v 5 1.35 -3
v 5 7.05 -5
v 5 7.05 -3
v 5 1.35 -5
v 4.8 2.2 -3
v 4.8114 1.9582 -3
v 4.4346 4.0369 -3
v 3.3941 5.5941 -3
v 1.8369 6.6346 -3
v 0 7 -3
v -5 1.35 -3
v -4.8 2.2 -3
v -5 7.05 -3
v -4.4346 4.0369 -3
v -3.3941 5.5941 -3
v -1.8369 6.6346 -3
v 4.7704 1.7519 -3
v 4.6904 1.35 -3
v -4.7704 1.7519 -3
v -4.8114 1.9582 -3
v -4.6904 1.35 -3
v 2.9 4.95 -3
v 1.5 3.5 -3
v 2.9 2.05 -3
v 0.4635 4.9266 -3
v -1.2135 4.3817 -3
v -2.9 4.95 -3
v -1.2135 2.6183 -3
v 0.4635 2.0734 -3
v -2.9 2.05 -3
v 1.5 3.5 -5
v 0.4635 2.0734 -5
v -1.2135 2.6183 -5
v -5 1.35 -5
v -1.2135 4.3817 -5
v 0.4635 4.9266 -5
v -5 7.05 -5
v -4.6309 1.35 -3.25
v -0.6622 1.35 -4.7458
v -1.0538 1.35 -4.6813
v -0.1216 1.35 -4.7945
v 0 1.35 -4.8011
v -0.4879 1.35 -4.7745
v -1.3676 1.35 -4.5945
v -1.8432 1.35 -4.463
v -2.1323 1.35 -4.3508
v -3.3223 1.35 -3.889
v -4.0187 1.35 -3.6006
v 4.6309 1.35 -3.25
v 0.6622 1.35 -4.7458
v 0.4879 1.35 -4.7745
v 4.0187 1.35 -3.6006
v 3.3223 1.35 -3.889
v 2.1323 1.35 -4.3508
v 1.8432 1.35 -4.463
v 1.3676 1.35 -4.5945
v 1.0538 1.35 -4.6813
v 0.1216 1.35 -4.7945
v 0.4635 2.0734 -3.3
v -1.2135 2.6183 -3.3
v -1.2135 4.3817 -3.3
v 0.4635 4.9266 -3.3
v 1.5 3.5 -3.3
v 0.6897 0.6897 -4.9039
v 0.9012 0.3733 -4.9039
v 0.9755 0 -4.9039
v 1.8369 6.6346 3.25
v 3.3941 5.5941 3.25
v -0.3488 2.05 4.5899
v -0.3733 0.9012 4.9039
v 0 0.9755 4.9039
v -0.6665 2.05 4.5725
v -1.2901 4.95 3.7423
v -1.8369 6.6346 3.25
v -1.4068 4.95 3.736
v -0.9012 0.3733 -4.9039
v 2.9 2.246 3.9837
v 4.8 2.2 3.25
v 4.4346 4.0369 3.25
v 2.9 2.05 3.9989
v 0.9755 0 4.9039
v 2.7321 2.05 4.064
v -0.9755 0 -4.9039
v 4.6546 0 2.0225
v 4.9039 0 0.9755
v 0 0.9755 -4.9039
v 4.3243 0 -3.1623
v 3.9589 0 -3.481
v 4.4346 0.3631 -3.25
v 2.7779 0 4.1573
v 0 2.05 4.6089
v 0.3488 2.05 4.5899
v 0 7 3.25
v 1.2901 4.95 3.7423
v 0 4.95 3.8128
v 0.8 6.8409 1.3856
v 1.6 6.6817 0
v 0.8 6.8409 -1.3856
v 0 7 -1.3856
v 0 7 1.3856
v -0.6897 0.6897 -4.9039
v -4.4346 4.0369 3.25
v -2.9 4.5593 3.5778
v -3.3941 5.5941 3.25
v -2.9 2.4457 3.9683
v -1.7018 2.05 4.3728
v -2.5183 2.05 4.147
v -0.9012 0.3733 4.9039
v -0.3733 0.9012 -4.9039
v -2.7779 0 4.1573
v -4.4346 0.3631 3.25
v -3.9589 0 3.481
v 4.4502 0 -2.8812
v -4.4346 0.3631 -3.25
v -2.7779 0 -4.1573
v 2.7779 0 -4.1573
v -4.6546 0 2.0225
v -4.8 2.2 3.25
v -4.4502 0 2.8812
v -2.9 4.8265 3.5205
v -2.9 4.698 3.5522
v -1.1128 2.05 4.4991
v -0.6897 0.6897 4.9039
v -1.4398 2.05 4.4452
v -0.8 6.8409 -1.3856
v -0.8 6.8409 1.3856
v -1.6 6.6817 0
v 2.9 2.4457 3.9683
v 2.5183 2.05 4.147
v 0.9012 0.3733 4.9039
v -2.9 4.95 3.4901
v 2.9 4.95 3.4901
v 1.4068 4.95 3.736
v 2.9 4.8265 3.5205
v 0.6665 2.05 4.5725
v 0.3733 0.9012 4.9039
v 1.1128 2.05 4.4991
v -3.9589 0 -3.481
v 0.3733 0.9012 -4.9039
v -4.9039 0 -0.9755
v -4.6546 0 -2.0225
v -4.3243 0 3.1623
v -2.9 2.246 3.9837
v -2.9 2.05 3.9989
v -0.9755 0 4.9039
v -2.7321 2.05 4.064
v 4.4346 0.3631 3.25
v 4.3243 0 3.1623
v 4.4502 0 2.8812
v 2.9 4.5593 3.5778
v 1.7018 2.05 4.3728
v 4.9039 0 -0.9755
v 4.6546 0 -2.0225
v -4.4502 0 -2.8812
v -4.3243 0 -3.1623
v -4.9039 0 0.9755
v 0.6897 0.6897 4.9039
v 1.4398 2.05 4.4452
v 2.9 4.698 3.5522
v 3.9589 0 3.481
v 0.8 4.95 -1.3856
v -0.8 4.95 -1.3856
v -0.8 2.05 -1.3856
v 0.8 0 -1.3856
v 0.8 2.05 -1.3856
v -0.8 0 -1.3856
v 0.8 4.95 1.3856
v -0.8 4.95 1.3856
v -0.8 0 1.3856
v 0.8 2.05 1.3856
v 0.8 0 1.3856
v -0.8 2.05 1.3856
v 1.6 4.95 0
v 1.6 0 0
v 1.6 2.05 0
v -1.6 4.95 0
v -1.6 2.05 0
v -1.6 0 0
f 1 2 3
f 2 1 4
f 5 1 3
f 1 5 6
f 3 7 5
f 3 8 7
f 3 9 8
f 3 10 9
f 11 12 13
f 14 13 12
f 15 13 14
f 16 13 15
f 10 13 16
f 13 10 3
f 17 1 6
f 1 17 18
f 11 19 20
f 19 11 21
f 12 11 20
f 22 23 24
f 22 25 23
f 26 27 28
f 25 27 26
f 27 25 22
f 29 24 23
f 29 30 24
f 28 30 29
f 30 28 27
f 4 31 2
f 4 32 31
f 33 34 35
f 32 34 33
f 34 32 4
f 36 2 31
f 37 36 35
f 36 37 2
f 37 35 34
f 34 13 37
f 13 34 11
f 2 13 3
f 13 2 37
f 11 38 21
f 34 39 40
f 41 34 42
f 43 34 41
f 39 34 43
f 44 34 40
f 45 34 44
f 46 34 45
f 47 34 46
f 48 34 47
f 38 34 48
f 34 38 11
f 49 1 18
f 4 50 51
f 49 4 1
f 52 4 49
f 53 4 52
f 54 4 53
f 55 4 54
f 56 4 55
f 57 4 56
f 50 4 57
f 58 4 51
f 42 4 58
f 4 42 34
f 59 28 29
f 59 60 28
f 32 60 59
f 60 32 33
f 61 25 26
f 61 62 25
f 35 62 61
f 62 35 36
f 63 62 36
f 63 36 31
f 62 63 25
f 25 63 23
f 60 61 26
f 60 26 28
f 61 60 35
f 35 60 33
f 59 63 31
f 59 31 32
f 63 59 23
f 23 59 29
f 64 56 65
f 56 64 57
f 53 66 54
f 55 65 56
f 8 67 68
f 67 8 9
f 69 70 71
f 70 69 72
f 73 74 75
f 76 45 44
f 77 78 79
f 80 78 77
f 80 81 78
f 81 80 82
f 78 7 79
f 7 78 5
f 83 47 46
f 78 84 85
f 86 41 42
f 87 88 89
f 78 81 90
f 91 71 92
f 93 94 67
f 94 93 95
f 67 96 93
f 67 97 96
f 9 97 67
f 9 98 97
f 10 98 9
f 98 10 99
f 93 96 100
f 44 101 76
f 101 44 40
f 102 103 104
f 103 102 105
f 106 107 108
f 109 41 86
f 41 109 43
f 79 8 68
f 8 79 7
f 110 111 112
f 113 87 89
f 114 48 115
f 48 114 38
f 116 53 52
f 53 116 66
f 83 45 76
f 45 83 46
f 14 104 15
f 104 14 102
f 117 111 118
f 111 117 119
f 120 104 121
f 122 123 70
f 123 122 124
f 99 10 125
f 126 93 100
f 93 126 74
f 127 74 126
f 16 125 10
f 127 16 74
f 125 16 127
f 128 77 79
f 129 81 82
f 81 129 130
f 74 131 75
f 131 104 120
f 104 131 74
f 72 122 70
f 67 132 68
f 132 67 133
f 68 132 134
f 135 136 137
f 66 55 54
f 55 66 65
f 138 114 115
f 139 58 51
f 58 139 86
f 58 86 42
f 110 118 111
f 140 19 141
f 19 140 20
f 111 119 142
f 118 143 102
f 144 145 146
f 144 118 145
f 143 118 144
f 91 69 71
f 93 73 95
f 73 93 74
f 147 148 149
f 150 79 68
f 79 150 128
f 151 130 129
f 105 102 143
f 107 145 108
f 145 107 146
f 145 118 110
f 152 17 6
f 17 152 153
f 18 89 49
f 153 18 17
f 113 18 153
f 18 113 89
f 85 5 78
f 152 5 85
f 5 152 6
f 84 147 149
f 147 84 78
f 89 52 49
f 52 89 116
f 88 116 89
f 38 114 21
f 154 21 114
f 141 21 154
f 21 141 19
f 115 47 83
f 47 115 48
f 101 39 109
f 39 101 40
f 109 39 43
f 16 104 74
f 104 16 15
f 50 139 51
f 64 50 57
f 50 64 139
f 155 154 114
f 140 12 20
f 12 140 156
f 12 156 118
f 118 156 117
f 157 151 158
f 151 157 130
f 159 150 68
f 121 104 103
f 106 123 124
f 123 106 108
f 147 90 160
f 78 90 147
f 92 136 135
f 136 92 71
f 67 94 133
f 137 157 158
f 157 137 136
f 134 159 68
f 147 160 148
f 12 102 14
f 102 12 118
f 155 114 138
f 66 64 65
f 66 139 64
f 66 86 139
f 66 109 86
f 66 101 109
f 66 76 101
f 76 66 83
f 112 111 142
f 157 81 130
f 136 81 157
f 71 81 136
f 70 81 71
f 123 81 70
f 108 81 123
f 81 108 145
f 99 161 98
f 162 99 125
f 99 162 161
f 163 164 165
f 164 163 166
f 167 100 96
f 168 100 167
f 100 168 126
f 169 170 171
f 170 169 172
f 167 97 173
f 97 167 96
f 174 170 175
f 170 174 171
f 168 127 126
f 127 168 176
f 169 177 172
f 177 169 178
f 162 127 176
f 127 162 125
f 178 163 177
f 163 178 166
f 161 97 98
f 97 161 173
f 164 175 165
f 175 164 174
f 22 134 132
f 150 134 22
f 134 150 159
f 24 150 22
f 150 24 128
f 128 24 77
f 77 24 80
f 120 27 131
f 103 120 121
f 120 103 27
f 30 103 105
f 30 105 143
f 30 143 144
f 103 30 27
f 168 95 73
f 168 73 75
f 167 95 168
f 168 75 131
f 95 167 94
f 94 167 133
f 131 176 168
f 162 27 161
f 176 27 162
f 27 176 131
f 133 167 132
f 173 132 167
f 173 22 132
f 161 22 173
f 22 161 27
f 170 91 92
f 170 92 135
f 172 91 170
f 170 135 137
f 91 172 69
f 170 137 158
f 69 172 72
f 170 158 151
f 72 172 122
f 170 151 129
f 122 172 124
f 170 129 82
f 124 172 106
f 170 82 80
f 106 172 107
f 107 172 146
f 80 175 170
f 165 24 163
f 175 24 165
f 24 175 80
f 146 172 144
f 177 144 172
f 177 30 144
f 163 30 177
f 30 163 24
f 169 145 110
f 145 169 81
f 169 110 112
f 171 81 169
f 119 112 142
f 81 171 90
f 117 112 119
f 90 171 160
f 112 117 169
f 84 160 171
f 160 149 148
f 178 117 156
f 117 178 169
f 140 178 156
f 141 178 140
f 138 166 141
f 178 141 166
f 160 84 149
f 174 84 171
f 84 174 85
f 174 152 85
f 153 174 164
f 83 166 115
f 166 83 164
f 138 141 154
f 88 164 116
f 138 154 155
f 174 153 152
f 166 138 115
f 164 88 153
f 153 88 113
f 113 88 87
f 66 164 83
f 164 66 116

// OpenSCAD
// file: link.scad
include <constant.scad>;
use <connector.scad>;

//rotate(a=[90,0,0]) Link(200);

AddThreeInnerConnectors();
AddThreeLinks();

module Link(lenght = 10){
    color("lightgray")
    linear_extrude(height = lenght, center = true){
        offset(r=.2){
        square(size = [1.6, 1.6], center = true);
        }
    }
}

module AddThreeLinks(height = 150, radius = 46){
    // Three inner connectors to attach other parts
    translate([radius*cos(0),radius*sin(0 + 3.5),0]) rotate(a=[0,0,90]) Link(height);
    translate([radius*cos(0),radius*sin(0 - 3.5),0]) rotate(a=[0,0,90]) Link(height);
    
    translate([radius*cos(120 + 3.5),radius*sin(120 + 3.5),0]) rotate(a=[0,0,-149]) Link(height);
    translate([radius*cos(120 - 3.5),radius*sin(120 - 3.5),0]) rotate(a=[0,0,-149]) Link(height);
    
    translate([radius*cos(-120 + 3.5),radius*sin(-120 + 3.5),0]) rotate(a=[0,0,-30]) Link(height);
    translate([radius*cos(-120 - 3.5),radius*sin(-120 - 3.5),0]) rotate(a=[0,0,-30]) Link(height);
}
// file: asset.scad
$fn = 80;
$fa = 10;

//Ball();
%Bolt(9);
//LDR();
//Micro();
//translate([0,0,10]) Nut();
//Ping();
//translate([10,10, 60]) Power(height = 120);
//Servo();
//Wheel();

module Ball(ball = 16){
    color("yellow") sphere(r=ball / 2);
}

module Bolt(h = 9){
    color("silver")
    union(){
        cylinder(1.55, 5/2, 5/2);
        cylinder(h, 2.85/2, 2.85/2);
    }
}

module LDR(){
    translate([-14.7/2, -27.05/2, -7.9/2]) union(){
        color("blue")
        linear_extrude(height = 1.25){
            difference(){
                square([14.7, 27.05]);
                translate([14.7/2, 7.34]) circle(r = 3.12 / 2, $fn=180);
            }
        }
        color("darkblue")
        linear_extrude(height = 7.90){
            translate([14.7/2, 12.2]) square([6.97, 6.97]);
        }
        color("red")
        translate([14.7/2, 27.05+3, 4.85/2+1]) rotate([90,0,0]) cylinder(3, 4.85/2, 4.85/2);
    }
}

module Micro(){
    translate([-15.2/2, -36.4/2, -(11.63+2.04)/2]) union(){
        color("red")
        linear_extrude(height = 1.25){
            difference(){
                square([15.2, 36.4]);
                translate([15.2/2, 7.3]) circle(r = 3.12 / 2, $fn=180);
                translate([3.2, 36.4 - 5.36]) square([15.2-3.2*2, 5.36]);
            }
        }
        color("blue")
        linear_extrude(height = 11.63){
            translate([0, 10.87]) square([4.33, 9.46]);
        }
        color([.71, .651, .259])
        translate([2.27/2, 12.04, 11.63]) linear_extrude(height = 2.04){
            circle(r = 2.27 / 2, $fn=180);
        }
        color("silver")
        translate([15.2/2, 36.4, 8.5-6/2])  rotate([90,0,0])
        linear_extrude(height = 5.36){
            circle(r = 6 / 2, $fn=180);
        }
        
    }
}

module Nut(){
    color("silver")
    union(){
        linear_extrude(height = 2.4, center = true){
            difference(){
                circle(d = 6.20, $fn=6);    
                circle(r = 2.85 / 2, $fn=180);   
            }
        }
    }
}    

module Ping(){
    // Ping / Parallax : 16,3 mm of diameter   
    union() {
        color("blue")
        cube([45.7, 2, 18.8], center = true);
        
        color("white")
        translate([45.7/2 - 16.3/2 - 2, -15.3/2, 0])
        rotate(a=[90,0,0])
        cylinder(h = 15.3, r = 16.3/2, center = true);

        color("white")
        translate([-45.7/2 + 16.3/2 + 2, -15.3/2, 0])
        rotate(a=[90,0,0])
        cylinder(h = 15.3, r = 16.3/2, center = true);
    }
}

module Power(height = 120) {
    // Li ion power pack: 12 cm x 2 cm x 2 cm
    // Dimension include USB adaptater
    union() {
        color("grey")
        cube([20, 20, height], center = true);          
    }
}

module Sector(radius=20, angles=[45, 135], fn=24) {
    r = radius / cos(180 / fn);
    step = -360 / fn;

    points = concat([[0, 0]],
        [for(a = [angles[0] : step : angles[1] - 360]) 
            [r * cos(a), r * sin(a)]
        ],
        [[r * cos(angles[1]), r * sin(angles[1])]]
    );

    difference() {
        circle(radius, $fn = fn);
        polygon(points);
    }
}

module Servo() {
// Fitec FS90R
// https://cdn-shop.adafruit.com/product-files/2442/FS90R-V2.0_specs.pdf
    union() {
        color("blue")
        cube([23.2, 12.5, 23], center = true);
        color("white")
        translate([-32.6/2, -12.5 / 2, 23 - 16.4 - 2.4])
        cube([32.6, 12.5, 2.4]);
        color("blue")
        translate([23.2/2-12.5/2, 0, 23/2])   
        cylinder(h = 27.3-23, r = 12.5/2);
        color("white")
        translate([23.2/2-12.5/2, 0, 23/2+27.3-23])   
        cylinder(h = 2, r = 2.4); 
    }
}

module Wheel(){
    // Pololu wheel 8 mm x 60 mm
    //https://www.pololu.com/product/2819
    color("black")
    translate([0,4,0]) rotate([90,0,0])
    union(){
        linear_extrude(height=8){
            difference(){
                circle(r=30);
                circle(r=30-5/2);          
            }            
            for (a = [0:2:360])
            translate([(30)*cos(a), (30)*sin(a), 0]) rotate([0,0,a])
            square([0.5,0.5],center=true); 
        }

        translate([0,0,(8-1)/2])linear_extrude(height=1){
            difference(){
                circle(r=10);
                circle(r=2.5/2);
                translate([6,0,0]) circle(r=2.5/2);
                translate([-6,0,0]) circle(r=2.5/2);
            }
             
            for (a = [0:360/5:360])
            translate([(10+20/2-.35)*cos(a), (10+20/2-0.35)*sin(a), 0]) rotate([0,0,a]) 
            difference(){
                square([20,5],center=true);
                offset(r=1) square([10,1],center=true);
            }
        }
    }
}
// file: constant.scad
/*
Parameters used by each OpenSCAD files
$fa     default value 12, minimum 0.01
$fs     default value 2, minimum 0.01
*/

if(STL == true){
    /*
    For STL
    */

    $fn = 360;
    $fa = 1;
    $fs = 1;
    echo("3D printing parameters");
} else {
    /*
    Design or rapid rendering
    */

    $fn = 40;
    $fa = 12;
    $fs = 15;
    echo("Design or rapid rendering parameters");
}
// main file
use <constant.scad>;
use <asset.scad>;
use <link.scad>;

InnerConnector();
//translate([0,-10,0]) OuterConnector();
//translate([20,0,0]) RailConnector();


//Design();
//Demo();

//AddThreeInnerConnectors();

module Design(){
    color("green") difference(){
        union(){
            InnerConnector();
            OuterConnector();
        }
        translate([-2.5,0,0]) cube([5,15,15], center = true);
    }
    translate([0,-4.25,0]) rotate(a=[-90,0,0]) Bolt(10);
    translate([0,3.5,0]) rotate(a=[90,90,0]) Nut();
    color("blue") translate([2.8,0,0]) Link(20);
    color("blue") translate([-2.8,0,0]) Link(20);
}

module InnerConnector(){
    color("gray")    
    difference(){
        Connector();
        translate([0,-5,0]) rotate(a=[0,0,0]) cube([12, 10, 12], center = true);
        
        // For the link
      //  translate([-2.8,0,0]) rotate(a=[0,0,0]) cube([2.1, 2, 10], center = true);
        //translate([2.8,0,0]) rotate(a=[0,0,0]) cube([2.1, 2, 10], center = true);
    }
}

module OuterConnector(){
    color("gray")
    difference(){
        Connector();
        translate([0, 5, 0]) rotate(a=[0,0,0]) cube([12, 10, 12], center = true);
   
        // For the link
     //   translate([-2.8,0,0]) rotate(a=[0,0,0]) cube([2.1, 2, 10], center = true);
      //  translate([2.8,0,0]) rotate(a=[0,0,0]) cube([2.1, 2, 10], center = true);
    }
}


module RailConnector(){
    color("gray") rotate(a=[0,0,180])
    difference(){
        union(){
            Connector();
            translate([0, -5.7/2, -4]) rotate(a=[0,0,0]) cube([10, 5.7, 2], center = true);
        }
        translate([0, 5, 0]) rotate(a=[0,0,0]) cube([12, 10, 12], center = true);
    }
}


module Connector(){
    union(){
        
        // The inner connector should be attach to each part
        difference(){
            translate([0, 4.2, -4]) rotate(a=[0,0,0]) cube([10, 5.7, 2], center = true);
            
            // Little hole to push the nut
            translate([0,3.5,-7]) rotate(a=[0,0,0]) cylinder(8,1.5,1.5);
        }
        
        difference(){
            hull(){
                sphere(5);
                linear_extrude(height = 6.5, center = true){
                    translate([0,2.2,0]) circle(4.8);
                }
            }
            
            // For the bolt
            translate([0,-2.5,0]) rotate(a=[90,0,0]) cylinder(4,2.8,2.8);
            translate([0,0,0]) rotate(a=[90,0,0]) cylinder(15,3.2/2,3.2/2, center = true);
            
            // For the nut
            translate([0,3.5,0.7]) rotate(a=[0,0,0]) cube([5.8, 2.9, 8], center = true);
           
            // Little hole to push the nut
            translate([0,3.5,-7]) rotate(a=[0,0,0]) cylinder(8,1.5,1.5);
        }
    }
}

module AddThreeInnerConnectors(radius = 46){
    // Three inner connectors to attach other parts
    translate([radius*cos(0),radius*sin(0),0]) rotate(a=[0,0,90]) InnerConnector();
    translate([radius*cos(120),radius*sin(120),0]) rotate(a=[0,0,-149]) InnerConnector();   
    translate([radius*cos(-120),radius*sin(-120),0]) rotate(a=[0,0,-30]) InnerConnector();  
}

module AddThreeHolesForInnerConnector(radius = 46){
    position = radius - 3.5;
    translate([position *cos(0)   , position *sin(0)   , -7]) cylinder(8,1.5,1.5);
    translate([position *cos(120) , position *sin(120) , -7]) cylinder(8,1.5,1.5);   
    translate([position *cos(-120), position *sin(-120), -7]) cylinder(8,1.5,1.5);
}

module AddThreeRailConnectors(radius = 46){
    // Three connectors to attach the body to basehead
    translate([radius*cos(0),radius*sin(0),0]) rotate(a=[0,0,90]) RailConnector();
    translate([radius*cos(120),radius*sin(120),0]) rotate(a=[0,0,-149]) RailConnector();   
    translate([radius*cos(-120),radius*sin(-120),0]) rotate(a=[0,0,-30]) RailConnector();
}
